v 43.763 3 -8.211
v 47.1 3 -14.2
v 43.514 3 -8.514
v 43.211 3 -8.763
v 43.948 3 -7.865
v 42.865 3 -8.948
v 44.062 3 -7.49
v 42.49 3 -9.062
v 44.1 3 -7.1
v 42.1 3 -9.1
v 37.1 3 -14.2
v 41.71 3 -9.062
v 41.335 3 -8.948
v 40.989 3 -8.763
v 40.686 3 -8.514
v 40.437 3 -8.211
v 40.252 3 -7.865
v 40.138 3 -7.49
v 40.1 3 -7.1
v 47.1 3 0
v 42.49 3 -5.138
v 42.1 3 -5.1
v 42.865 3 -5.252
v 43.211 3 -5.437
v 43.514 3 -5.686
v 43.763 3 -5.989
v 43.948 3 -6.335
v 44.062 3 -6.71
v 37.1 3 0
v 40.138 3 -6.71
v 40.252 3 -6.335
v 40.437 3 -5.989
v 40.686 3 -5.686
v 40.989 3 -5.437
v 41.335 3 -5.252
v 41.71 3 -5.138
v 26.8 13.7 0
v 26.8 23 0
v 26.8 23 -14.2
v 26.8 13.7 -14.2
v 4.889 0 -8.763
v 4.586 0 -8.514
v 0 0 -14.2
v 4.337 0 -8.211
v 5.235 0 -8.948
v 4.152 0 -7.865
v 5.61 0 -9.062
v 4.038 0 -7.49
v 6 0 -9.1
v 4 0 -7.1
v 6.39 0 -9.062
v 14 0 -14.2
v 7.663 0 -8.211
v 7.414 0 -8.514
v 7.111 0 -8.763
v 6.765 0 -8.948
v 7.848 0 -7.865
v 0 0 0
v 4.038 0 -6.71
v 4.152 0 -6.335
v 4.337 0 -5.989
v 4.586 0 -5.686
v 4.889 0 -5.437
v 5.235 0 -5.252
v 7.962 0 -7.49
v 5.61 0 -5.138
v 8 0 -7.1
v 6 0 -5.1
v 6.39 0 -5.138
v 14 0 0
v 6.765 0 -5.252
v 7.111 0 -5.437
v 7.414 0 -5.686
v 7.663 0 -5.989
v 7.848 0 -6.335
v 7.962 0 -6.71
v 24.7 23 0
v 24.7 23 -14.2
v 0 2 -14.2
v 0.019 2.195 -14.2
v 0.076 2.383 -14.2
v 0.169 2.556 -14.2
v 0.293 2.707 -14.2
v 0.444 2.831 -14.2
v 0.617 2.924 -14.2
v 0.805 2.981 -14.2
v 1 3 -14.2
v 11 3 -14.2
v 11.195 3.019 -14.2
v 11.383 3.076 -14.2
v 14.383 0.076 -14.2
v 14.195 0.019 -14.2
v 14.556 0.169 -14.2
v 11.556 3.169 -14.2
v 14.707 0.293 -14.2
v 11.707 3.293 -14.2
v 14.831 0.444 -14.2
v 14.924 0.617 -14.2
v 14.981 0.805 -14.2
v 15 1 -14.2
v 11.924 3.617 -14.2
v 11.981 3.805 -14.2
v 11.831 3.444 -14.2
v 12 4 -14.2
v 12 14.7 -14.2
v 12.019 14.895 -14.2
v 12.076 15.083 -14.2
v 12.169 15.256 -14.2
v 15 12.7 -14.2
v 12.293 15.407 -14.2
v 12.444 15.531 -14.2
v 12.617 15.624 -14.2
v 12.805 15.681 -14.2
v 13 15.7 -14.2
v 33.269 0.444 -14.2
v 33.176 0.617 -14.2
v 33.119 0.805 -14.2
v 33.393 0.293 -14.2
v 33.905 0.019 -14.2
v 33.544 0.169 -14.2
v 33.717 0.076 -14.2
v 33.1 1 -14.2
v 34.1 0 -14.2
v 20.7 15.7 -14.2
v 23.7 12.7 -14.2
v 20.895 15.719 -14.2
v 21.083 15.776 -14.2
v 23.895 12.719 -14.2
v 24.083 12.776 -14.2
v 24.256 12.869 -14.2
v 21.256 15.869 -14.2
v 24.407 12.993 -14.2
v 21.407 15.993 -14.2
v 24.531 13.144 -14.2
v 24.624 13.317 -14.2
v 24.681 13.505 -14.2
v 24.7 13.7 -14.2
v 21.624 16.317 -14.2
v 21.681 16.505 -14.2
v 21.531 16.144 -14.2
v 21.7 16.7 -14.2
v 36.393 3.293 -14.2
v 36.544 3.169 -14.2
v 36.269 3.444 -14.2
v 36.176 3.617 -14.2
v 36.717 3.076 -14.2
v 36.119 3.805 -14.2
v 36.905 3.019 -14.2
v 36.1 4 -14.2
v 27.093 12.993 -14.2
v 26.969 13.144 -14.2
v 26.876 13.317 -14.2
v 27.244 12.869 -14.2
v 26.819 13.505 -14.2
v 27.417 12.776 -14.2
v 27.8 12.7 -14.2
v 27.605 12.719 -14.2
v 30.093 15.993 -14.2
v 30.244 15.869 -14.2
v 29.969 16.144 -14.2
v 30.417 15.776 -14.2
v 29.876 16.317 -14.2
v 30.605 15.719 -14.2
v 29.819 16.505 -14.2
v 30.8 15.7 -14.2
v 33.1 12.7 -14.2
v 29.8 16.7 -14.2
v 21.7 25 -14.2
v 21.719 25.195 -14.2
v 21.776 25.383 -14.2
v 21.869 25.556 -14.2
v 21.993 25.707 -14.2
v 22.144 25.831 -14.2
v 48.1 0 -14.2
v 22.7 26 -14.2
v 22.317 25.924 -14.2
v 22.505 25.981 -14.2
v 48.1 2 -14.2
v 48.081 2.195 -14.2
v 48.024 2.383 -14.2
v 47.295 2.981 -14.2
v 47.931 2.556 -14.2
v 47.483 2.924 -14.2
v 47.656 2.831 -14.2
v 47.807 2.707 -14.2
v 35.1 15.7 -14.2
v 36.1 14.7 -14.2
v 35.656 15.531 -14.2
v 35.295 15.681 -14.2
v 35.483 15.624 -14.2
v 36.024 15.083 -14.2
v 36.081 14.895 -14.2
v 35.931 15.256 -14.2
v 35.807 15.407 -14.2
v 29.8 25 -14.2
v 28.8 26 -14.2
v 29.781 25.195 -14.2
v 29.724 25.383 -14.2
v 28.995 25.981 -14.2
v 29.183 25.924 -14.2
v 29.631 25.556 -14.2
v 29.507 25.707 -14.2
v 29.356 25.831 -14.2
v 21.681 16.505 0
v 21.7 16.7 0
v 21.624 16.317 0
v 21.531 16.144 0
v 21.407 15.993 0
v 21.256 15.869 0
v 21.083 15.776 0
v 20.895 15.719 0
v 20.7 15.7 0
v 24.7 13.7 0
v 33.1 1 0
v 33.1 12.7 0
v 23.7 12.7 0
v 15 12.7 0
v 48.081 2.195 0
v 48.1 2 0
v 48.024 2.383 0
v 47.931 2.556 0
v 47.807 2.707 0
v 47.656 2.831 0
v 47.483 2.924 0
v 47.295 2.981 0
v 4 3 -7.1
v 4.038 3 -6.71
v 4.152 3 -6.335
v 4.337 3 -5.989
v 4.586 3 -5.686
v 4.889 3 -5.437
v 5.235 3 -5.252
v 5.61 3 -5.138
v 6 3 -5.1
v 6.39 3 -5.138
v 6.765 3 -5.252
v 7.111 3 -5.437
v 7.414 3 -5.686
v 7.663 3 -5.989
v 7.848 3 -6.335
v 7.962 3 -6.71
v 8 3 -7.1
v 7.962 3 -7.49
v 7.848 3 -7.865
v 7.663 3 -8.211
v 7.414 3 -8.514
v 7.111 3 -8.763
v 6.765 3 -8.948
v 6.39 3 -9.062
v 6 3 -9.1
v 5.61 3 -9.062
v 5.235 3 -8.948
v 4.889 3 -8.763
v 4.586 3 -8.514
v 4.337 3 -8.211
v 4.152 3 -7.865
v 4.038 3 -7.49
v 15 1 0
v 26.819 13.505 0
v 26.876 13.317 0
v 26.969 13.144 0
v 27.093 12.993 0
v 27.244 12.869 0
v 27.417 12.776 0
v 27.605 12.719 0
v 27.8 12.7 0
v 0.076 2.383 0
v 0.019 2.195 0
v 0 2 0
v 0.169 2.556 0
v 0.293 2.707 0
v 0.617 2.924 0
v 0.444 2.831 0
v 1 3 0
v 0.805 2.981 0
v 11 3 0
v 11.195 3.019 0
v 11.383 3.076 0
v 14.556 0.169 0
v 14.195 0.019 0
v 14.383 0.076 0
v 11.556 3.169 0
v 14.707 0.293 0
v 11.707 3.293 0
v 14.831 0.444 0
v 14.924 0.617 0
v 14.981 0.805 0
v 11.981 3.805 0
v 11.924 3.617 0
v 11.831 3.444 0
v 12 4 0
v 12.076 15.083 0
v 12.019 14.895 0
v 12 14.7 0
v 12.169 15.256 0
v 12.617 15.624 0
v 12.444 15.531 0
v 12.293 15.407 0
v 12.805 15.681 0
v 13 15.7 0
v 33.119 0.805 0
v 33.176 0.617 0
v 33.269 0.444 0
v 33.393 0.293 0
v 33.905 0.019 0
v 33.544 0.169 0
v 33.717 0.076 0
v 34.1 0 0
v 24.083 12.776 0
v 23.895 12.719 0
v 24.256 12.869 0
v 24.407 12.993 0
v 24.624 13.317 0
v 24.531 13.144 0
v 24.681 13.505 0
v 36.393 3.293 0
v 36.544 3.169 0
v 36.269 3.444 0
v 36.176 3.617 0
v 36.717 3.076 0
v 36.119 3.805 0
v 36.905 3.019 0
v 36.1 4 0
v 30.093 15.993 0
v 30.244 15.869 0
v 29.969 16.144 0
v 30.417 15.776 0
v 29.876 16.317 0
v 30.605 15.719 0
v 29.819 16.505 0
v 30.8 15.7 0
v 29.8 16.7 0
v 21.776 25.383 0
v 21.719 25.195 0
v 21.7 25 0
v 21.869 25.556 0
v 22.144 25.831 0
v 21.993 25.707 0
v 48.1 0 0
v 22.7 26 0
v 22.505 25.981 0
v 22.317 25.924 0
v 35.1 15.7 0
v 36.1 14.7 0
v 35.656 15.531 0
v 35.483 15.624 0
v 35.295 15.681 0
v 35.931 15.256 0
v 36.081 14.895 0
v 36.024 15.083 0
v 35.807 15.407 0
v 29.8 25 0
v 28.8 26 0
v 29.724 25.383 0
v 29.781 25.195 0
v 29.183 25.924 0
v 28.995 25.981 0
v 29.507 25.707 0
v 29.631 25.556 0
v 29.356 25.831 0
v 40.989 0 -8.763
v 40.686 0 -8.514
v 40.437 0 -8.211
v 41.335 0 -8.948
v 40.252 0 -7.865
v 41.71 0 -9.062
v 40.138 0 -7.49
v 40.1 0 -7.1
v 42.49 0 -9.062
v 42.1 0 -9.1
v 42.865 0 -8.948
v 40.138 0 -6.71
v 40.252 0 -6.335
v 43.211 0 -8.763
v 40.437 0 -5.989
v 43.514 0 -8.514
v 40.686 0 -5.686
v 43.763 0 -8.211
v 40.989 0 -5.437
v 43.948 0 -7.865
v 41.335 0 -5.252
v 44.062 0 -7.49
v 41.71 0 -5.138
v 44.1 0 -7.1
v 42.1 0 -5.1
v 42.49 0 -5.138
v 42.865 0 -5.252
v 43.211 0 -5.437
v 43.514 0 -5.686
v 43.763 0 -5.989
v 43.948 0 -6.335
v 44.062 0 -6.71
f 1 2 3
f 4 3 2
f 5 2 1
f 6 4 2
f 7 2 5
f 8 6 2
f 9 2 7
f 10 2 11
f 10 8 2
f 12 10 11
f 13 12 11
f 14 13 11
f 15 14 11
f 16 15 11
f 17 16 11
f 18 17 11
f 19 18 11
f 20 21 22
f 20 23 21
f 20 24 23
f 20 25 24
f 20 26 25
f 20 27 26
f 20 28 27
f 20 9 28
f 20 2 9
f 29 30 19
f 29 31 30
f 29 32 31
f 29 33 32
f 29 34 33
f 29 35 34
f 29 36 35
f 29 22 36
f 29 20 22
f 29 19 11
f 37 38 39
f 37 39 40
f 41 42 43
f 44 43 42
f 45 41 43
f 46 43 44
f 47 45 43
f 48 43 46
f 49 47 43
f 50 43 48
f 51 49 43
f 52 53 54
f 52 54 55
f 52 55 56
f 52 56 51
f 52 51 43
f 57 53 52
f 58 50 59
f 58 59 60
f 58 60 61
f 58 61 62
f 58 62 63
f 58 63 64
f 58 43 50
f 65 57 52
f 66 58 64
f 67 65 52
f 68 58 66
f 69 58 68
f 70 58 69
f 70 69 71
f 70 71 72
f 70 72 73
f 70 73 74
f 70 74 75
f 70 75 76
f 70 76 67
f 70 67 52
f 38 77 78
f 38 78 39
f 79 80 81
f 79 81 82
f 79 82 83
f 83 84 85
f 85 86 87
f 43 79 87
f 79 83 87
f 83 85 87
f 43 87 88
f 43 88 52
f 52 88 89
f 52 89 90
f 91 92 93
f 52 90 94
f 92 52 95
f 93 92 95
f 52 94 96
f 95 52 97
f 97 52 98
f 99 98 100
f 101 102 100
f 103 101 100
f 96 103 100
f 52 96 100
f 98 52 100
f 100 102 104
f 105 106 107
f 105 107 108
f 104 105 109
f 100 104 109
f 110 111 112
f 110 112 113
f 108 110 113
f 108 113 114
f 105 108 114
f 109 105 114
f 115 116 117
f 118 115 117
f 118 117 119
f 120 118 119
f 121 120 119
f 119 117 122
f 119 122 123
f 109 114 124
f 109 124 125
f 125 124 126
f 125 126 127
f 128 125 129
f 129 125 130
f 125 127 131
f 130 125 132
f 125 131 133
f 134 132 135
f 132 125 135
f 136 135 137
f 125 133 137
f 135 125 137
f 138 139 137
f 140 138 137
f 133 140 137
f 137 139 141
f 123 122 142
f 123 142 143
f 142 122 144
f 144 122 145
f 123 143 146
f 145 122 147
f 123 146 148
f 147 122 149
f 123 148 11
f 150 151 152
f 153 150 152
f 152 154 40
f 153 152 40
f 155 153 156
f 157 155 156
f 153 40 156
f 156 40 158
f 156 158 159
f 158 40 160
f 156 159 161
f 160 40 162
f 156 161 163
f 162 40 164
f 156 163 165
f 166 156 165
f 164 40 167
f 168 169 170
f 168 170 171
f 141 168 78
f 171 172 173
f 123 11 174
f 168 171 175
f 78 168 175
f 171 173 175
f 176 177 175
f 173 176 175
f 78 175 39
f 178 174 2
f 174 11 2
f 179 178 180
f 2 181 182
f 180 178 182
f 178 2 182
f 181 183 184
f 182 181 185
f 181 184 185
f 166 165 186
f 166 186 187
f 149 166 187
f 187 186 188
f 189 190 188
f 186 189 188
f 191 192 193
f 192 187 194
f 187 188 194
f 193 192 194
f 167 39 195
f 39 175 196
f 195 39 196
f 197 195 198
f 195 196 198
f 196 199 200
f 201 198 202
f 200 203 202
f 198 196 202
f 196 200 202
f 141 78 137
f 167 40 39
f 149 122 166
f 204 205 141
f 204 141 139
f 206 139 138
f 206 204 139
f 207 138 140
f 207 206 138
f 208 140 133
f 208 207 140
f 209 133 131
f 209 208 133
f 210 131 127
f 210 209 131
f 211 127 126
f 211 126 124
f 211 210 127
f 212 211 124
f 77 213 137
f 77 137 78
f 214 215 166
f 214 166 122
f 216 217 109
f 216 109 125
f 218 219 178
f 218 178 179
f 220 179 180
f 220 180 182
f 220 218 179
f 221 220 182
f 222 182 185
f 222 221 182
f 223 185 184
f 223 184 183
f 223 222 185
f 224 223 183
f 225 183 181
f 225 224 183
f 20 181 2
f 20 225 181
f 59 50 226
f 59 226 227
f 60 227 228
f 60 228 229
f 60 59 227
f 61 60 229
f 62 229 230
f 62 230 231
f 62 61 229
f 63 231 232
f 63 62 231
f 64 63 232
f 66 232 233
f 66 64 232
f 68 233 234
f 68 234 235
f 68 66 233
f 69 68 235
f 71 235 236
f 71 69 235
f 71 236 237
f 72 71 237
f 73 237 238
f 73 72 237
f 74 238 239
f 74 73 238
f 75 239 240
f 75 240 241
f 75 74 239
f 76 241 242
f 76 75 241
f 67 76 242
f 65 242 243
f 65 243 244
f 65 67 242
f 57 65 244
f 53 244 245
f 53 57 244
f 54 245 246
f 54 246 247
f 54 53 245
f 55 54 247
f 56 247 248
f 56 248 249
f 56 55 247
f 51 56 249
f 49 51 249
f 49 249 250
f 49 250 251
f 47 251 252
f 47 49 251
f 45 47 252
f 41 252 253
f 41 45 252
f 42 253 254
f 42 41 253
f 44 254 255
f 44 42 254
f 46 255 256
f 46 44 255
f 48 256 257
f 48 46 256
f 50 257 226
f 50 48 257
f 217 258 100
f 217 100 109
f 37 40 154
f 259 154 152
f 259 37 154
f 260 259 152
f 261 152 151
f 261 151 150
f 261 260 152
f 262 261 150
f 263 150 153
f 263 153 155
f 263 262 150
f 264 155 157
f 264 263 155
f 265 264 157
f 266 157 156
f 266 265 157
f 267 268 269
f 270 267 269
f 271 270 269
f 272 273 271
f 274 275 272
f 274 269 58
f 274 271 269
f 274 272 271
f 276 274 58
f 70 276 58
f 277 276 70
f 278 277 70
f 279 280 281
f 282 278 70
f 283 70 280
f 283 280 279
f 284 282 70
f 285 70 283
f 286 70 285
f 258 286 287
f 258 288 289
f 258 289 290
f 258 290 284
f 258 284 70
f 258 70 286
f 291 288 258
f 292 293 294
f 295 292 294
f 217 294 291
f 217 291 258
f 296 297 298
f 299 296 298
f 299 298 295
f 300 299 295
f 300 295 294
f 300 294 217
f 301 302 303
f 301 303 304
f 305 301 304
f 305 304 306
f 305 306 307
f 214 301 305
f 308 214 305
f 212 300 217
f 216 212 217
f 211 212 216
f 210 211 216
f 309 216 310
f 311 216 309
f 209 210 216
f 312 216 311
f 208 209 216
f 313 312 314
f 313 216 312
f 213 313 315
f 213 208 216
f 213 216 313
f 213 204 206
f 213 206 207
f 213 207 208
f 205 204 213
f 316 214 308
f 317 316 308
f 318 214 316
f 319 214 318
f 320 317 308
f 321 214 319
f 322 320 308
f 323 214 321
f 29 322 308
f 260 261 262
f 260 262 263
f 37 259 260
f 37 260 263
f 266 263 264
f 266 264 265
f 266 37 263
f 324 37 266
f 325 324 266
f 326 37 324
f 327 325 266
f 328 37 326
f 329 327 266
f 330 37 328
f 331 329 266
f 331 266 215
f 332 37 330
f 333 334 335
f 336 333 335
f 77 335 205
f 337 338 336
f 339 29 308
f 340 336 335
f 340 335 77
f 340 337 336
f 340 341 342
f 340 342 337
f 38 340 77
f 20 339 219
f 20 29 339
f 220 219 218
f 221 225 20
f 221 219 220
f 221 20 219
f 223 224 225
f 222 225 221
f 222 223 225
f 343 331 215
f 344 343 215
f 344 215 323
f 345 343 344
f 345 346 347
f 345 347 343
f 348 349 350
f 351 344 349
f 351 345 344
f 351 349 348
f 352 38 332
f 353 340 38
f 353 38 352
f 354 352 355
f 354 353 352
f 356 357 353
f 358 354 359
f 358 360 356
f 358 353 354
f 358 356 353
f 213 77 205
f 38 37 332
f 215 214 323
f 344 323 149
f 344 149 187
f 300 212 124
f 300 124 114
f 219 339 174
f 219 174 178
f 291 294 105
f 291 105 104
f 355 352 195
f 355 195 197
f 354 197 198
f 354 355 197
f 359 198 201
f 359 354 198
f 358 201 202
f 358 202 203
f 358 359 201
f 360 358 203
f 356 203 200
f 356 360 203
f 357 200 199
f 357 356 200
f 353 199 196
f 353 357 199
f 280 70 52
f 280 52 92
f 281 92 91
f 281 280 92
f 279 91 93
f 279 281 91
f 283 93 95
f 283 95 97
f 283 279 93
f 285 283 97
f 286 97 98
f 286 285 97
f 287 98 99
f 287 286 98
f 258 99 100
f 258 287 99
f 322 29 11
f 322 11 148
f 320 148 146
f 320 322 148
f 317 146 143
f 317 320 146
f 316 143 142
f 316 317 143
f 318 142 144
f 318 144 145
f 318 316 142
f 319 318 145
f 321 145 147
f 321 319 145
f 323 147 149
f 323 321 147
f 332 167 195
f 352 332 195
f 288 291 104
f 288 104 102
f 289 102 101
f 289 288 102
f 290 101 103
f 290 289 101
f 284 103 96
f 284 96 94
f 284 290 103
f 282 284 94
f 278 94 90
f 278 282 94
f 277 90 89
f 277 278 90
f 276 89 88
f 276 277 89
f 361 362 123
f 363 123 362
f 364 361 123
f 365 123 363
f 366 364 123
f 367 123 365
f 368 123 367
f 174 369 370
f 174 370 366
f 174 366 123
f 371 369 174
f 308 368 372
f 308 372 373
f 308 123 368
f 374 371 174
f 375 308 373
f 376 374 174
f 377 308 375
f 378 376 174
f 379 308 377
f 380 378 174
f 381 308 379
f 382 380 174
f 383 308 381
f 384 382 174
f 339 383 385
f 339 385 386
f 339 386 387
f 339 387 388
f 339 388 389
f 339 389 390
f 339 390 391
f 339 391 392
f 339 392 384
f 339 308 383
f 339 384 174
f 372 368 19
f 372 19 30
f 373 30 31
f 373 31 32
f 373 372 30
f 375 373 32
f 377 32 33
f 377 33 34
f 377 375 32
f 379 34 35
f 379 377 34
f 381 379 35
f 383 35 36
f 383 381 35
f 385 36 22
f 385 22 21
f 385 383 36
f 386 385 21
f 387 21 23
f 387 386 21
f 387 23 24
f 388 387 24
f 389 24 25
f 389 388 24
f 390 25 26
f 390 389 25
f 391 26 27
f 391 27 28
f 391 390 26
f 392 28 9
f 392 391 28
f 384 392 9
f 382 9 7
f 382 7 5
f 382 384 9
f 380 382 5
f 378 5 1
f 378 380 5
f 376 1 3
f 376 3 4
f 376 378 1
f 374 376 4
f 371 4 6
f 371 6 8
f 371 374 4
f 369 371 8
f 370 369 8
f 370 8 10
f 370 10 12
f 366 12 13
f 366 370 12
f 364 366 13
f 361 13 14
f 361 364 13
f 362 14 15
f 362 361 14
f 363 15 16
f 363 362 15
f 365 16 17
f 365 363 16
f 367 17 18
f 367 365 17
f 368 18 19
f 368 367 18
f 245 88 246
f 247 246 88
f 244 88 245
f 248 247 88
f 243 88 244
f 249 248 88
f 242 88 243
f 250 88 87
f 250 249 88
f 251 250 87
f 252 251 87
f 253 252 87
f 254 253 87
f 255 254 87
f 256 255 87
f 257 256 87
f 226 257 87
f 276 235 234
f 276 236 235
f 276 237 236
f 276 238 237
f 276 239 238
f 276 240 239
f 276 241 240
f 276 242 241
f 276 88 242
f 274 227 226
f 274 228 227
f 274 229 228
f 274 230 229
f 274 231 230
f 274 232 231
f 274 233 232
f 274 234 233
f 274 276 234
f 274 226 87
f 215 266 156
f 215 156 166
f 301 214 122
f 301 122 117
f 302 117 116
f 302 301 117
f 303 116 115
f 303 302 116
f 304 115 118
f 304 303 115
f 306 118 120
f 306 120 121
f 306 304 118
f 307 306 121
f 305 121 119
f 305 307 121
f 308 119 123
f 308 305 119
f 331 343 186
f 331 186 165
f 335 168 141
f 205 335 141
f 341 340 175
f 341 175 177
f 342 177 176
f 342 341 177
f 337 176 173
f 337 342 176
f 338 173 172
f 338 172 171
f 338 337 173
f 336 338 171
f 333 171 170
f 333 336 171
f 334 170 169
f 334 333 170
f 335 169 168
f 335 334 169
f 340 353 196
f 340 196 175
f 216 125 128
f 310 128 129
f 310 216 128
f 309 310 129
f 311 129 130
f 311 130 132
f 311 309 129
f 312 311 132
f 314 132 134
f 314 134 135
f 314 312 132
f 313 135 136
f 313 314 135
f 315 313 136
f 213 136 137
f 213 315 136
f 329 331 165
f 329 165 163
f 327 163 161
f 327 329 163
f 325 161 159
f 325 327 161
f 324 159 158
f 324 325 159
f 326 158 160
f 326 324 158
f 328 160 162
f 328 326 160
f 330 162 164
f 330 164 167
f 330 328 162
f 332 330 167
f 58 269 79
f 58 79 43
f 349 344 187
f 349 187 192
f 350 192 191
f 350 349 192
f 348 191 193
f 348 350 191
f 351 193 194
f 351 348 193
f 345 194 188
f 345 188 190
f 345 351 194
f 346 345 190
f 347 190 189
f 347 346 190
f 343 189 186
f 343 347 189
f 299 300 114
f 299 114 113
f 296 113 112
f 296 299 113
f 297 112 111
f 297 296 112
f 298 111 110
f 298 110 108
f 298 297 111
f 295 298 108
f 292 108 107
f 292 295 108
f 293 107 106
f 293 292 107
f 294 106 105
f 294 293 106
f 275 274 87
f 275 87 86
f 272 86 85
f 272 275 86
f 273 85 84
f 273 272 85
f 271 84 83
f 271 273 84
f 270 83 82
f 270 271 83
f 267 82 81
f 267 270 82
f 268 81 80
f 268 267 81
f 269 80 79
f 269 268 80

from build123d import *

# Parameters (mm, degrees)
BOSS_EXTRUDE1_DEPTH = 14.2
SKETCH2_R           = 2
CUT_EXTRUDE1_DEPTH  = 3


with BuildPart() as part:
    # Sketch1 → Boss-Extrude1 (new body)
    with BuildSketch(Plane.XY):
        with BuildLine():
            Line((0, 0), (12, 0))
            Line((12, 0), (14, 0))
            ThreePointArc((14, 0), (14.707106781, 0.292893219), (15, 1))
            Line((15, 1), (15, 12.7))
            Line((15, 12.7), (23.7, 12.7))
            ThreePointArc((23.7, 12.7), (24.407106781, 12.992893219), (24.7, 13.7))
            Line((24.7, 13.7), (24.7, 23))
            Line((24.7, 23), (26.8, 23))
            Line((26.8, 23), (26.8, 13.7))
            ThreePointArc((26.8, 13.7), (27.092893219, 12.992893219), (27.8, 12.7))
            Line((27.8, 12.7), (33.1, 12.7))
            Line((33.1, 12.7), (33.1, 1))
            ThreePointArc((33.1, 1), (33.392893219, 0.292893219), (34.1, 0))
            Line((34.1, 0), (48.1, 0))
            Line((48.1, 0), (48.1, 2))
            ThreePointArc((48.1, 2), (47.807106781, 2.707106781), (47.1, 3))
            Line((47.1, 3), (37.1, 3))
            ThreePointArc((37.1, 3), (36.392893219, 3.292893219), (36.1, 4))
            Line((36.1, 4), (36.1, 14.7))
            ThreePointArc((36.1, 14.7), (35.807106781, 15.407106781), (35.1, 15.7))
            Line((35.1, 15.7), (30.8, 15.7))
            ThreePointArc((30.8, 15.7), (30.092893219, 15.992893219), (29.8, 16.7))
            Line((29.8, 16.7), (29.8, 25))
            ThreePointArc((29.8, 25), (29.507106781, 25.707106781), (28.8, 26))
            Line((28.8, 26), (22.7, 26))
            ThreePointArc((22.7, 26), (21.992893219, 25.707106781), (21.7, 25))
            Line((21.7, 25), (21.7, 16.7))
            ThreePointArc((21.7, 16.7), (21.407106781, 15.992893219), (20.7, 15.7))
            Line((20.7, 15.7), (13, 15.7))
            ThreePointArc((13, 15.7), (12.292893219, 15.407106781), (12, 14.7))
            Line((12, 14.7), (12, 4))
            ThreePointArc((12, 4), (11.707106781, 3.292893219), (11, 3))
            Line((11, 3), (1, 3))
            ThreePointArc((1, 3), (0.292893219, 2.707106781), (0, 2))
            Line((0, 2), (0, 0))
        make_face()
    extrude(amount=-BOSS_EXTRUDE1_DEPTH)

    # Sketch2 → Cut-Extrude1 (cut)
    with BuildSketch(Plane(origin=(0, 0, 0), x_dir=(1, 0, 0), z_dir=(0, 1, 0))):
        with Locations(Location((42.1, 7.1, 0), (0, 0, 180))):  # turned: the seam where the file's is
            Circle(SKETCH2_R)
        with Locations(Location((6, 7.1, 0), (0, 0, 180))):  # turned: the seam where the file's is
            Circle(SKETCH2_R)
    extrude(amount=CUT_EXTRUDE1_DEPTH, mode=Mode.SUBTRACT)


solid = part.part
